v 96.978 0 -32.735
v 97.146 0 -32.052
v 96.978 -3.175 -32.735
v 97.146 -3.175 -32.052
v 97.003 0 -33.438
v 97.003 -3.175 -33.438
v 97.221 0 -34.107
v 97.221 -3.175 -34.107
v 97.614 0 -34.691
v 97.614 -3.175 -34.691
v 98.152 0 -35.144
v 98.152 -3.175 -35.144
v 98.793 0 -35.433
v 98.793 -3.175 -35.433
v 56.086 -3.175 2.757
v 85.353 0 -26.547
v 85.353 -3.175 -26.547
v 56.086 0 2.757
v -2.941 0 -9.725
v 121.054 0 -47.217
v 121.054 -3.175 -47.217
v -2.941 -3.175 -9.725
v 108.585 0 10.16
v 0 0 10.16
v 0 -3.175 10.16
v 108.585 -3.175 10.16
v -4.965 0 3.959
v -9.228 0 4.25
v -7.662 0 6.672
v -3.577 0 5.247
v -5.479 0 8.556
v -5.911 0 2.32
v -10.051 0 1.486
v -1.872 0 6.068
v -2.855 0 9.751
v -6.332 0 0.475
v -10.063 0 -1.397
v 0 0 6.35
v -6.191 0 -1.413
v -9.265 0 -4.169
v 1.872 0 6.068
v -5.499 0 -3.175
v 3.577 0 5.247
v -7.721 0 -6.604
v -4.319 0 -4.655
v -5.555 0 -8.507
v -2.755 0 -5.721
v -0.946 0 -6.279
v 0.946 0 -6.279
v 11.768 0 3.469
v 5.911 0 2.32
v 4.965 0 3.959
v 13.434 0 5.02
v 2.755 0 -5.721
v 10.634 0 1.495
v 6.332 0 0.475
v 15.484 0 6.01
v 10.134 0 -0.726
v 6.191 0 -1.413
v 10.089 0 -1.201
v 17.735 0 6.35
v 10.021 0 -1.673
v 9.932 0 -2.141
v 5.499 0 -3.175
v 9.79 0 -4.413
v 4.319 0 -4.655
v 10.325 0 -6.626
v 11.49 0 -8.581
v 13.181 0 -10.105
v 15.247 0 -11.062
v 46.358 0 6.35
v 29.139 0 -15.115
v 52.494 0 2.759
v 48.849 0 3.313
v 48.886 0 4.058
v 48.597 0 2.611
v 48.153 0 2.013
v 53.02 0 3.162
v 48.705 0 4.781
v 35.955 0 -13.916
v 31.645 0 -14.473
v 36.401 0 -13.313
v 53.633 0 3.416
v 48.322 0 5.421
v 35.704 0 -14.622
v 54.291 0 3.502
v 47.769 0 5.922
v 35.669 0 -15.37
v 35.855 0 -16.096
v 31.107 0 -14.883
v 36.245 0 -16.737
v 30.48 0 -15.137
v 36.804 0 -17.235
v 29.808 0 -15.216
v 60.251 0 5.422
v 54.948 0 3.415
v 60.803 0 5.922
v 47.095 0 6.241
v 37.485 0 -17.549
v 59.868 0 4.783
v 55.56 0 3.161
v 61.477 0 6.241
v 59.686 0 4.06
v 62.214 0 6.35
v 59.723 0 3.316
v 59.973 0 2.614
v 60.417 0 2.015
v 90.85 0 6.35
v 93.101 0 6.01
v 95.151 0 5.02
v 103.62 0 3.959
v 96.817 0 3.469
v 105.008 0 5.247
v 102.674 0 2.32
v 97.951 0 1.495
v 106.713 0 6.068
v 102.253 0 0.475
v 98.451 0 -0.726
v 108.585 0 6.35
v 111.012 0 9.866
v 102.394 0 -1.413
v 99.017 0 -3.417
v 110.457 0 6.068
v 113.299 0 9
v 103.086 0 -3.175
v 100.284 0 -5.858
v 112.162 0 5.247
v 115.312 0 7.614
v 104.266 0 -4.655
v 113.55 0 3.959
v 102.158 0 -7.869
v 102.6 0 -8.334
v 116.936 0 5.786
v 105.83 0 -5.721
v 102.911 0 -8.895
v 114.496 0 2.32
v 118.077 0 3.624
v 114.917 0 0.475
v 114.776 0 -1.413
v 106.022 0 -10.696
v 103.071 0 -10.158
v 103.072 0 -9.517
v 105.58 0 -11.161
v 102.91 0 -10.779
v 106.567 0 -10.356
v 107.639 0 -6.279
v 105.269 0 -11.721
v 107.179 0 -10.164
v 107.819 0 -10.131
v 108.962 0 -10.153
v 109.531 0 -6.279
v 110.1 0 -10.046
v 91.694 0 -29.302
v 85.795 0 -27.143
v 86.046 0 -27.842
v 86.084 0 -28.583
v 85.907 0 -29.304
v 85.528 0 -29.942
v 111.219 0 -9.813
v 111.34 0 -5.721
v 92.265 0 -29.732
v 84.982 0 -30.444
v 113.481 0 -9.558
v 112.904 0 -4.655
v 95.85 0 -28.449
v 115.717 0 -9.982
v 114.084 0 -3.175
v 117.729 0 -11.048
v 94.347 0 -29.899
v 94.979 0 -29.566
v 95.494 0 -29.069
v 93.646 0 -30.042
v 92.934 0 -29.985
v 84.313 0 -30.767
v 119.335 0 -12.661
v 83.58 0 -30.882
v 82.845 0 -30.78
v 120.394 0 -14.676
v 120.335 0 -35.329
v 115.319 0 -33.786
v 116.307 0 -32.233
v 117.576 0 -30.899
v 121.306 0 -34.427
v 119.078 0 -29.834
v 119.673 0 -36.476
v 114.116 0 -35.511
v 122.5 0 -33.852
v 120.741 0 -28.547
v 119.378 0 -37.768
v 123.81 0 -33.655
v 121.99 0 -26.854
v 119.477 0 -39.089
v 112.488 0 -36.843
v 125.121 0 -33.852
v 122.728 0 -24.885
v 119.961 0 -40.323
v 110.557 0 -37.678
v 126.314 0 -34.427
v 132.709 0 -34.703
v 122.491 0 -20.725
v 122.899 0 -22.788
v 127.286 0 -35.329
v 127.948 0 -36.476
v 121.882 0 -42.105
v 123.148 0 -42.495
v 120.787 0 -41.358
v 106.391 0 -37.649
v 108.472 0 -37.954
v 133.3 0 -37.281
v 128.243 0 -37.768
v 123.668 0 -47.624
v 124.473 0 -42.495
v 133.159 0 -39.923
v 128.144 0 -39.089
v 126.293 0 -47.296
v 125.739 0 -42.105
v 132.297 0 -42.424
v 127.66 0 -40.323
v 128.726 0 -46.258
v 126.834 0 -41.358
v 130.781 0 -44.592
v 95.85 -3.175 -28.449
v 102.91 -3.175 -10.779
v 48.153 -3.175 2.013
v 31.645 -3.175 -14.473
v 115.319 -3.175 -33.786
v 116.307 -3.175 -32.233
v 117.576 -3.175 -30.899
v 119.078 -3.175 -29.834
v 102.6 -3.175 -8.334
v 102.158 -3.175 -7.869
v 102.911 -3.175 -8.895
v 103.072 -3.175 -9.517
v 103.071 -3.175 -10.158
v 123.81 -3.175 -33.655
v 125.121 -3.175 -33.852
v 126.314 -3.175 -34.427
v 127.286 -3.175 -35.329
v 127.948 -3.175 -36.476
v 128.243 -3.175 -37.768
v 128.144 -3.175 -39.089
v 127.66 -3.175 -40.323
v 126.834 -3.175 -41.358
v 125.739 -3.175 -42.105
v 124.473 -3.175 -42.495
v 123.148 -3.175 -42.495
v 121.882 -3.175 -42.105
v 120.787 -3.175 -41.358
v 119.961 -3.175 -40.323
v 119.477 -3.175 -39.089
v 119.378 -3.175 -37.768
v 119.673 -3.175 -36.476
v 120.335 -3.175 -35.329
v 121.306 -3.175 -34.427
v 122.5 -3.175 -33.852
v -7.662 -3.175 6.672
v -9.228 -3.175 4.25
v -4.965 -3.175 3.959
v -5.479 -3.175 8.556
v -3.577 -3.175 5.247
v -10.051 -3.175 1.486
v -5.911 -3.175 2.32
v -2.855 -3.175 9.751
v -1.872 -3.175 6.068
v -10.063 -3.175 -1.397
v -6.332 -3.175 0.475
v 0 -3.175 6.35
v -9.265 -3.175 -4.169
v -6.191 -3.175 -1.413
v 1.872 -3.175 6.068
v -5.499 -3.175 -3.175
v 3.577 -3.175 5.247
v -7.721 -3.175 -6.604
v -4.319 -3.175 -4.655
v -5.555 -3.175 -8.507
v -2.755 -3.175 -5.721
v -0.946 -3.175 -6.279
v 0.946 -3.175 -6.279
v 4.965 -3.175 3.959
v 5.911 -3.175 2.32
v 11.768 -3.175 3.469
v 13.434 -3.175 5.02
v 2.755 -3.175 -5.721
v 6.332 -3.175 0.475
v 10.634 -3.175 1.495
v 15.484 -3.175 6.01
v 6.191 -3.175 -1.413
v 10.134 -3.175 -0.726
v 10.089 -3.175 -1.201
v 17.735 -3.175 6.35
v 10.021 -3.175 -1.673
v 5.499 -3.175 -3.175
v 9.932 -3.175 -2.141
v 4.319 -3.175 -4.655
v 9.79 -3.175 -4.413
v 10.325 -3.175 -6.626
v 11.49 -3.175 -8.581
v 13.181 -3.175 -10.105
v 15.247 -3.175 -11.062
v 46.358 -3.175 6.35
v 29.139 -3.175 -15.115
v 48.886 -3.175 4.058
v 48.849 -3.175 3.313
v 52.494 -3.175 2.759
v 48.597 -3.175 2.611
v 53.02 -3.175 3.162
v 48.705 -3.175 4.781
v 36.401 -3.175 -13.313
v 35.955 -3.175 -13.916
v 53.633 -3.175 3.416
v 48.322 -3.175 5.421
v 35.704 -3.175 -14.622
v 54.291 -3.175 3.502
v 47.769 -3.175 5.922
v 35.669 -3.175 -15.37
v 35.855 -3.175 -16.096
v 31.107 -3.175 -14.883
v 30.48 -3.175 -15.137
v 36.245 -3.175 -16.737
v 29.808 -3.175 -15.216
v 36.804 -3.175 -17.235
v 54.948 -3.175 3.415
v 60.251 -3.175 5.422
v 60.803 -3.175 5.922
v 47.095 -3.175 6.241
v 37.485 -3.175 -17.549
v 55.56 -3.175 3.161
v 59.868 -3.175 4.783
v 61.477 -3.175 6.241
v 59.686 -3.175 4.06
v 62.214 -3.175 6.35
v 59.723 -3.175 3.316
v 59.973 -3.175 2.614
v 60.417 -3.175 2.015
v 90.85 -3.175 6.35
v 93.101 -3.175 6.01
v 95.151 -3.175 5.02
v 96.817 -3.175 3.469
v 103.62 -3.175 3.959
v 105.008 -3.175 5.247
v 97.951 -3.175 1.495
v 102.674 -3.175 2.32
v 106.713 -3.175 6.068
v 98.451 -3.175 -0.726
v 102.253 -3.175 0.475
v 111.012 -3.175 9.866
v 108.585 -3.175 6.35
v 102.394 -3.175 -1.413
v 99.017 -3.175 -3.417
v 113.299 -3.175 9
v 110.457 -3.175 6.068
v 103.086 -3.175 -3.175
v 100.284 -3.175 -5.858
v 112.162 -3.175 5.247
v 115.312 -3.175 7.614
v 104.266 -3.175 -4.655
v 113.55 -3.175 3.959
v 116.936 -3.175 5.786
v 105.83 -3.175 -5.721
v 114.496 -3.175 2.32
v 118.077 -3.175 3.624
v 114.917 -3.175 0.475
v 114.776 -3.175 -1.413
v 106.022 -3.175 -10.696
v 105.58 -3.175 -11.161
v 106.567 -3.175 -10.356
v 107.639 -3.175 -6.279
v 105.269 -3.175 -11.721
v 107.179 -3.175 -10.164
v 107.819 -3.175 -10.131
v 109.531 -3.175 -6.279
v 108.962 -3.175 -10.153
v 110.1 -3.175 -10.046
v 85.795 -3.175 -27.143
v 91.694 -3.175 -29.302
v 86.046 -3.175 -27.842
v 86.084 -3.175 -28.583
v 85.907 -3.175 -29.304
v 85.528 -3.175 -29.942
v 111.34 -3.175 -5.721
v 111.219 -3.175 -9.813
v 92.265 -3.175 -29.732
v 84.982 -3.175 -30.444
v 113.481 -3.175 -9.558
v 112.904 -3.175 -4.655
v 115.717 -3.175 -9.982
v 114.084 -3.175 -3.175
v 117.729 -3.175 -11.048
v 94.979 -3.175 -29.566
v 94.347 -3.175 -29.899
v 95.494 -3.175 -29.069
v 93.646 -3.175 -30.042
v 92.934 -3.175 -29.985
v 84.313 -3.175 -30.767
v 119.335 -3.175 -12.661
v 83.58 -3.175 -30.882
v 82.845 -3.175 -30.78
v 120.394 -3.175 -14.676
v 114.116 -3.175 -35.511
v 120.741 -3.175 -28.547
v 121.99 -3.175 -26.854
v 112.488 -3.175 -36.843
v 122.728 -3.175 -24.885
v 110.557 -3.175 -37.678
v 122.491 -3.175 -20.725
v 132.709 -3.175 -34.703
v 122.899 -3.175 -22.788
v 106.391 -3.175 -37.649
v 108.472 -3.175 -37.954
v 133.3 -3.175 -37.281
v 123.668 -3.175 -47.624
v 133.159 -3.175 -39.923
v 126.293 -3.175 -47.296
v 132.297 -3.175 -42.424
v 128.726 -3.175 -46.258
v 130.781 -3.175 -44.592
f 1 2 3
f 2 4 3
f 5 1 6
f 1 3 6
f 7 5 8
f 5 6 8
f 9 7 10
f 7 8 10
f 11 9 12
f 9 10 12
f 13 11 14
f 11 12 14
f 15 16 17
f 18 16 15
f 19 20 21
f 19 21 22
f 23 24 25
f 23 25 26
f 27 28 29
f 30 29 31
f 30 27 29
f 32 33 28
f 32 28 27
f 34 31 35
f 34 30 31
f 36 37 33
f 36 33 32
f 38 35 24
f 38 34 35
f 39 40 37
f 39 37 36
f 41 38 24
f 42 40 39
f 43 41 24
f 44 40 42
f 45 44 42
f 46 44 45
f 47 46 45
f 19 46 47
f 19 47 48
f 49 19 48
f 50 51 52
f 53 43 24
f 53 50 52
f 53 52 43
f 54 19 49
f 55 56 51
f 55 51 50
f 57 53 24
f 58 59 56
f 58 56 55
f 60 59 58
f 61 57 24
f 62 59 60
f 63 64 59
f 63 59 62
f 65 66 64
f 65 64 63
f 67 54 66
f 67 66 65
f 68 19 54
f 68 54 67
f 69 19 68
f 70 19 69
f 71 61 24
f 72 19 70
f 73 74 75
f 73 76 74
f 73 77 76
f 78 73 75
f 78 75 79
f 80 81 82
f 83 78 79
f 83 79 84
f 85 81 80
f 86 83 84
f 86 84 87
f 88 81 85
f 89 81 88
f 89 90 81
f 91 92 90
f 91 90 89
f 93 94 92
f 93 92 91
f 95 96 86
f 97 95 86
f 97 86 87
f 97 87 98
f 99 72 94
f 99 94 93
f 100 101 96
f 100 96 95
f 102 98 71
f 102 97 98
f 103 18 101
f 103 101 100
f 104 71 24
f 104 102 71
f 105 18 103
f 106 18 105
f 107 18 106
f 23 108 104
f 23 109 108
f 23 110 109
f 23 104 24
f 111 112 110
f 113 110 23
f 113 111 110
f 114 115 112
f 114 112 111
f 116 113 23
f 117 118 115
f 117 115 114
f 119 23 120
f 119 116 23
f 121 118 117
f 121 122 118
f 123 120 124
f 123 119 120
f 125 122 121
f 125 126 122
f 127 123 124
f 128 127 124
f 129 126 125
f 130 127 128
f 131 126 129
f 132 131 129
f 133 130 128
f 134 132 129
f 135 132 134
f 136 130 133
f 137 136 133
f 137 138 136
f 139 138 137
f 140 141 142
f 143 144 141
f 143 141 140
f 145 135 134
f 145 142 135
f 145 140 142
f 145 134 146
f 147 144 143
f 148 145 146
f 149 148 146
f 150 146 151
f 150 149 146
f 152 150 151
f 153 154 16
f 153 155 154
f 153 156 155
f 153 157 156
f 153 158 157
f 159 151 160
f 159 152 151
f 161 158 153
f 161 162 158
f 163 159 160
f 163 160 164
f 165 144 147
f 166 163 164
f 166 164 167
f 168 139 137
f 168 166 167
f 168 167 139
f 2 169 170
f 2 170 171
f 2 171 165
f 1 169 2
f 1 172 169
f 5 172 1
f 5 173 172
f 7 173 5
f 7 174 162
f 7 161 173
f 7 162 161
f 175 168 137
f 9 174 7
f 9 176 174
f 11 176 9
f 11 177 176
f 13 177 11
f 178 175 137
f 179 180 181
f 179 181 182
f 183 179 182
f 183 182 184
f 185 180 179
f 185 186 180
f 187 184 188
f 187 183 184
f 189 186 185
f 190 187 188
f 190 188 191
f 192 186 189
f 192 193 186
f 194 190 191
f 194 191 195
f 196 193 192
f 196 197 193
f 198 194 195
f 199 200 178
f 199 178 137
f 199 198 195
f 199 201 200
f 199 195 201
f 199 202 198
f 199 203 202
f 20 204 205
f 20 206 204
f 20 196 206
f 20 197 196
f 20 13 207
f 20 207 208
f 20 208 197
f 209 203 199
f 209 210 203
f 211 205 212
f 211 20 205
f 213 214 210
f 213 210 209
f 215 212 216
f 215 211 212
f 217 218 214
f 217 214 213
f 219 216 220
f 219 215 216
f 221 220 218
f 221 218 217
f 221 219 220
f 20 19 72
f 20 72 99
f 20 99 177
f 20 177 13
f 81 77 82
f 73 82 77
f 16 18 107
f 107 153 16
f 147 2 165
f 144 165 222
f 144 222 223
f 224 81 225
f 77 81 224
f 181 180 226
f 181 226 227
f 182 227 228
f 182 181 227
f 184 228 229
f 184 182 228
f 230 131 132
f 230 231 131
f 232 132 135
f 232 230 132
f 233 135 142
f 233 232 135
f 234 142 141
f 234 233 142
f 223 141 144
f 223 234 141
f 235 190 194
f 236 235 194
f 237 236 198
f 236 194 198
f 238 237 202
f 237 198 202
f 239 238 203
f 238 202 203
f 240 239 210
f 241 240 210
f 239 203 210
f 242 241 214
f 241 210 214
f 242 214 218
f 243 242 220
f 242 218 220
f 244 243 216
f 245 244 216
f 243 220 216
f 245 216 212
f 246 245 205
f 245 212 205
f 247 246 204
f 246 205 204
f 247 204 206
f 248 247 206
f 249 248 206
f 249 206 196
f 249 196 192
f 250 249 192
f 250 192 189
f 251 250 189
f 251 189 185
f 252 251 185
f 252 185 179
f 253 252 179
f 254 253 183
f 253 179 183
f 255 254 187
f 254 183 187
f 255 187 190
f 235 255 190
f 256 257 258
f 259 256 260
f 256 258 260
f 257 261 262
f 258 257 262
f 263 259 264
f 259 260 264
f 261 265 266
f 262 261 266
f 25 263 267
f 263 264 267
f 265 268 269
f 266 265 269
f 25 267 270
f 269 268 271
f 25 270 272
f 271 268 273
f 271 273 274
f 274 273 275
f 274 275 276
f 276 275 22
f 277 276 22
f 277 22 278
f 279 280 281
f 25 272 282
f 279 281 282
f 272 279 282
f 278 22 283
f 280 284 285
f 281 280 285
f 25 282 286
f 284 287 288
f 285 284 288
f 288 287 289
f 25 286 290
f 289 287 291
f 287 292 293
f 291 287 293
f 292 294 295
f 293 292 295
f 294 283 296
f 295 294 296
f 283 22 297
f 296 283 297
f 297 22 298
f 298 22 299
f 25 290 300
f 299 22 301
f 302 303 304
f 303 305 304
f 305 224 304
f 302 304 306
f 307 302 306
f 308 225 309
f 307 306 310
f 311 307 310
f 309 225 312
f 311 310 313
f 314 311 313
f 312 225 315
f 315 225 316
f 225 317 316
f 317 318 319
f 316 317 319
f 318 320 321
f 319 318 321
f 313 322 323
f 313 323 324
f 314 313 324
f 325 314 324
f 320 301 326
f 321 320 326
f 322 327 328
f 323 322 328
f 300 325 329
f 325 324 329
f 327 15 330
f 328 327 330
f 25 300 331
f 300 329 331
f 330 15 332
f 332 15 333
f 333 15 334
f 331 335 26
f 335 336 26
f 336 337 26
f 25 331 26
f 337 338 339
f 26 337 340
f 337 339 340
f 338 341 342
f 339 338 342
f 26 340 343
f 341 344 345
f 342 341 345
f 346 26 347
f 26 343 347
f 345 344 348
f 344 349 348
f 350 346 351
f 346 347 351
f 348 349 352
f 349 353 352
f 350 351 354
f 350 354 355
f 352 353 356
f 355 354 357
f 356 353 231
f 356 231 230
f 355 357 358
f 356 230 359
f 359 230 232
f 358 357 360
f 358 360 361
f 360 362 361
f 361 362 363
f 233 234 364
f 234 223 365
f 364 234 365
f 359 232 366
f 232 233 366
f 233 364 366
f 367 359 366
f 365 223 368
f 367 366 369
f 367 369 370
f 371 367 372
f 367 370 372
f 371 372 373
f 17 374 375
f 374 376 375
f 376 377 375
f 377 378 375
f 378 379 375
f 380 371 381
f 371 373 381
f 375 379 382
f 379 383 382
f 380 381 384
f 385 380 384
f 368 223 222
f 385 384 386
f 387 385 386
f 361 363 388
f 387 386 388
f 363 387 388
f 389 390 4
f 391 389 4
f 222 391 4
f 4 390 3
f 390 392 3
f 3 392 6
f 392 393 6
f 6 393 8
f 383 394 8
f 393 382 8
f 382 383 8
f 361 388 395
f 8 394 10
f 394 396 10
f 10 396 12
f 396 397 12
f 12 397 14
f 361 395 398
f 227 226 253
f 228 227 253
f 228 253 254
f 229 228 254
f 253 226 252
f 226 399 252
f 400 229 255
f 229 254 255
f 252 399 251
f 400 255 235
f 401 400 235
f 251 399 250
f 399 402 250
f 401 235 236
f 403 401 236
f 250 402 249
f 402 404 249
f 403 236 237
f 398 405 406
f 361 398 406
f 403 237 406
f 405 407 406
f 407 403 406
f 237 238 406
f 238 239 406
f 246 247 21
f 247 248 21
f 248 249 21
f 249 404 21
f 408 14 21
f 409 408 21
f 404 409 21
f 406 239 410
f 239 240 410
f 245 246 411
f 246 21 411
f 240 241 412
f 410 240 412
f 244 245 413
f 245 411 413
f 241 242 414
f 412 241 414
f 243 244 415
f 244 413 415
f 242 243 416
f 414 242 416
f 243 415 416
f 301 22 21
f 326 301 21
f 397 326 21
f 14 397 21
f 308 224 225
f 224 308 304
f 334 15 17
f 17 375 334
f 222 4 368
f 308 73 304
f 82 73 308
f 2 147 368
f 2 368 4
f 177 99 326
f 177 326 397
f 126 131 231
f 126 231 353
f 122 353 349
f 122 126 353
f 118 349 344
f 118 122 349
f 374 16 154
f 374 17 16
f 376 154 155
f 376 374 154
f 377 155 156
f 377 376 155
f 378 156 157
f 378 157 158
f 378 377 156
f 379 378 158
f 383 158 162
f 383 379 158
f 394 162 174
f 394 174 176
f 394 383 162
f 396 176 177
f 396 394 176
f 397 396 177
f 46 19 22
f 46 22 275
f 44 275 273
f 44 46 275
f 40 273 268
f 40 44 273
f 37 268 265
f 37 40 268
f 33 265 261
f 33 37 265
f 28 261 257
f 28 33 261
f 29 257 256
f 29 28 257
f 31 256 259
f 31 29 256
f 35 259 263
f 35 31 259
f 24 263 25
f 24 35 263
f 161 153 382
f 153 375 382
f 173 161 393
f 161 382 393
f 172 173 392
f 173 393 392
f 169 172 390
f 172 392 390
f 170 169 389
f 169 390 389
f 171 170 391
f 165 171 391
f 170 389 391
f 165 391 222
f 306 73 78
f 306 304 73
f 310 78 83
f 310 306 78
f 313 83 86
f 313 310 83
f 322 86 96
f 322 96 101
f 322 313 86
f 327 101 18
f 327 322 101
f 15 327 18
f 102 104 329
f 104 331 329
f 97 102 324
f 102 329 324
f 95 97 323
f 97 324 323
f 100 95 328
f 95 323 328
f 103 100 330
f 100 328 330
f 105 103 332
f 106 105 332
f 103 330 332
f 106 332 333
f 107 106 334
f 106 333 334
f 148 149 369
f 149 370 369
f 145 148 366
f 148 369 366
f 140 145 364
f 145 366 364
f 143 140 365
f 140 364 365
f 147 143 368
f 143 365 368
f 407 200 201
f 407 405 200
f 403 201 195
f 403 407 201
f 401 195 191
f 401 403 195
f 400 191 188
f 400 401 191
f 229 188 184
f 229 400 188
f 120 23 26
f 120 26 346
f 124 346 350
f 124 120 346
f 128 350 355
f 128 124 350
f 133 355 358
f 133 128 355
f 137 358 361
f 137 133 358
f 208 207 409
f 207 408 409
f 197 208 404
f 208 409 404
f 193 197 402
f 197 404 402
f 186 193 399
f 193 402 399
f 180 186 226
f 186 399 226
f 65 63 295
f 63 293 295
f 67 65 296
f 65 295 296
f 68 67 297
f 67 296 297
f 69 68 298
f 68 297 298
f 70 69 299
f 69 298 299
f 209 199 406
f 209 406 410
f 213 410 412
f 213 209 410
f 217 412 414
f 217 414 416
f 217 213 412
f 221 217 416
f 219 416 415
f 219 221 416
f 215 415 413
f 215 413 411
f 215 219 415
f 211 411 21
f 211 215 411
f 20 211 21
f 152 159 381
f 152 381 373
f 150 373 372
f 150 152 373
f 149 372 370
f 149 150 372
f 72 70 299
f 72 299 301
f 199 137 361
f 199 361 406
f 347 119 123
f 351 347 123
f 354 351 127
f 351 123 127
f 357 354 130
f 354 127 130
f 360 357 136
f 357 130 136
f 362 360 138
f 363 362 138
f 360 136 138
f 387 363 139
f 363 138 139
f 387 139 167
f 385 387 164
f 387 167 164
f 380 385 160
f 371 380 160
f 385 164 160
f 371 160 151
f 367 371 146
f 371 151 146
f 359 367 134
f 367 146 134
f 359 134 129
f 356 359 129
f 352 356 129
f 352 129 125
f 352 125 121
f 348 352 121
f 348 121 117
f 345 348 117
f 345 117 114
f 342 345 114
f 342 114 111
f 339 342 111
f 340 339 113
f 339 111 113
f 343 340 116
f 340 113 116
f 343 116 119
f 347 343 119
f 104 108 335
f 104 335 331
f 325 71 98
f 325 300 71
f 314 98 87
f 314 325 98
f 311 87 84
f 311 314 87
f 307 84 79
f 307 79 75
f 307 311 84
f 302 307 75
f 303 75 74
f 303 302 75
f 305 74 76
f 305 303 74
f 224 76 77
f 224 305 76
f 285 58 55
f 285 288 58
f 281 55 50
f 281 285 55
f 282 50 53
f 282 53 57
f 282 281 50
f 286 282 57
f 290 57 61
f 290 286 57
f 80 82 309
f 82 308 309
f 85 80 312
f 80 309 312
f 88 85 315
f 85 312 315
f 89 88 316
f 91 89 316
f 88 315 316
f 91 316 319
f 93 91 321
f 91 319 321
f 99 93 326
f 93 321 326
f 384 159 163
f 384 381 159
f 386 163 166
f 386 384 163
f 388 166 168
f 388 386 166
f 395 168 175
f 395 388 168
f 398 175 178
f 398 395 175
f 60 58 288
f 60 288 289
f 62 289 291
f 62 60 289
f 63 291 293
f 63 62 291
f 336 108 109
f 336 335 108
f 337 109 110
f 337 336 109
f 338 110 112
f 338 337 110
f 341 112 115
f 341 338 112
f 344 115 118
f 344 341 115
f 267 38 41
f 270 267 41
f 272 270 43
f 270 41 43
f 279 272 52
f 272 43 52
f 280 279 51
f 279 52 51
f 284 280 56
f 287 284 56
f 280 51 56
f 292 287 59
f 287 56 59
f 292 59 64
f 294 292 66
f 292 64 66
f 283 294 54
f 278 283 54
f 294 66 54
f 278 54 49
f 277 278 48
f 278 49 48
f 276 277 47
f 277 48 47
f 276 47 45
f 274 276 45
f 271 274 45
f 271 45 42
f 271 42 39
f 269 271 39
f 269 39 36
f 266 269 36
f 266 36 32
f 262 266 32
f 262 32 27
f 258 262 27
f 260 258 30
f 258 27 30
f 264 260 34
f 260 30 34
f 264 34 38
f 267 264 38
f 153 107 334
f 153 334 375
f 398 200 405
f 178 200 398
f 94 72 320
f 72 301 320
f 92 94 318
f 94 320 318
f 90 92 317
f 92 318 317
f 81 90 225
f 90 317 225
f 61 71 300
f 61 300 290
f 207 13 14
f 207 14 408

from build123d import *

# Parameters (mm, degrees)
SKETCH1_R           = 6.35
SKETCH1_R_2         = 4.445
BOSS_EXTRUDE4_DEPTH = 3.175
FILLET1_R           = 7.62
FILLET2_R           = 2.54


with BuildPart() as part:
    # Sketch1 → Boss-Extrude4 (new body)
    with BuildSketch(Plane(origin=(0, 0, 0), x_dir=(1, 0, 0), z_dir=(0, 1, 0))):
        with BuildLine():
            ThreePointArc((132.708902298, 34.70274992), (130.780561186, 44.591665065), (121.053534347, 47.21732518))
            Line((121.053534347, 47.21732518), (-2.940598336, 9.725146859))
            ThreePointArc((-2.940598336, 9.725146859), (-10.050698784, -1.486288652), (0, -10.16))
            Line((0, -10.16), (108.585, -10.16))
            ThreePointArc((108.585, -10.16), (114.347311535, -8.367877017), (118.076794146, -3.623733419))
            Line((118.076794146, -3.623733419), (132.708902298, 34.70274992))
        make_face()
        with BuildLine():
            Line((5.835638087, 8.316906163), (30.582028831, 15.535454115))
            Line((30.582028831, 15.535454115), (52.49530672, -6.35))
            Line((52.49530672, -6.35), (7.931147458, -6.35))
            ThreePointArc((7.931147458, -6.35), (10.057864095, 1.437000294), (5.835638087, 8.316906163))
        make_face(mode=Mode.SUBTRACT)
        Polygon((33.363906977, 16.346930867), (92.350223331, 33.55330078), (54.291359033, -4.553949138), align=None, mode=Mode.SUBTRACT)
        with BuildLine():
            Line((94.419089716, 32.030410831), (103.665421891, 8.889507929))
            ThreePointArc((103.665421891, 8.889507929), (98.617756781, 1.969685918), (100.653852542, -6.35))
            Line((100.653852542, -6.35), (56.087411343, -6.35))
            Line((56.087411343, -6.35), (94.419089716, 32.030410831))
        make_face(mode=Mode.SUBTRACT)
        with BuildLine():
            Line((96.107879032, 34.649412861), (114.478426945, 40.008120819))
            ThreePointArc((114.478426945, 40.008120819), (116.909216359, 31.534937584), (125.250600093, 28.684518542))
            Line((125.250600093, 28.684518542), (117.182643526, 5.413513258))
            ThreePointArc((117.182643526, 5.413513258), (112.325487778, 9.446393554), (106.024105012, 9.831958953))
            Line((106.024105012, 9.831958953), (96.107879032, 34.649412861))
        make_face(mode=Mode.SUBTRACT)
        with Locations(Location((108.585, 0, 0), (0, 0, 270))):
            Circle(SKETCH1_R, mode=Mode.SUBTRACT)
        with Locations(Location((123.810345287, 38.1, 0), (0, 0, 270))):
            Circle(SKETCH1_R_2, mode=Mode.SUBTRACT)
        with Locations(Location((0, 0, 0), (0, 0, 270))):
            Circle(SKETCH1_R, mode=Mode.SUBTRACT)
    extrude(amount=-BOSS_EXTRUDE4_DEPTH)

    # Fillet1
    fillet1_edges = [part.edges().sort_by_distance(p)[0] for p in [
        (5.835638087, -1.5875, -8.316906163),
        (7.931147458, -1.5875, 6.35),
        (100.653852542, -1.5875, 6.35),
        (125.250600093, -1.5875, -28.684518542),
        (114.478426945, -1.5875, -40.008120819),
        (117.182643526, -1.5875, -5.413513258),
    ]]
    fillet(fillet1_edges, radius=FILLET1_R)

    # Fillet2
    fillet2_edges = [part.edges().sort_by_distance(p)[0] for p in [
        (92.350223331, -1.5875, -33.55330078),
        (33.363906977, -1.5875, -16.346930867),
        (54.291359033, -1.5875, 4.553949138),
        (30.582028831, -1.5875, -15.535454115),
        (52.49530672, -1.5875, 6.35),
        (103.665421891, -1.5875, -8.889507929),
        (94.419089716, -1.5875, -32.030410831),
        (56.087411343, -1.5875, 6.35),
        (96.107879032, -1.5875, -34.649412861),
        (106.024105012, -1.5875, -9.831958953),
    ]]
    fillet(fillet2_edges, radius=FILLET2_R)


solid = part.part
